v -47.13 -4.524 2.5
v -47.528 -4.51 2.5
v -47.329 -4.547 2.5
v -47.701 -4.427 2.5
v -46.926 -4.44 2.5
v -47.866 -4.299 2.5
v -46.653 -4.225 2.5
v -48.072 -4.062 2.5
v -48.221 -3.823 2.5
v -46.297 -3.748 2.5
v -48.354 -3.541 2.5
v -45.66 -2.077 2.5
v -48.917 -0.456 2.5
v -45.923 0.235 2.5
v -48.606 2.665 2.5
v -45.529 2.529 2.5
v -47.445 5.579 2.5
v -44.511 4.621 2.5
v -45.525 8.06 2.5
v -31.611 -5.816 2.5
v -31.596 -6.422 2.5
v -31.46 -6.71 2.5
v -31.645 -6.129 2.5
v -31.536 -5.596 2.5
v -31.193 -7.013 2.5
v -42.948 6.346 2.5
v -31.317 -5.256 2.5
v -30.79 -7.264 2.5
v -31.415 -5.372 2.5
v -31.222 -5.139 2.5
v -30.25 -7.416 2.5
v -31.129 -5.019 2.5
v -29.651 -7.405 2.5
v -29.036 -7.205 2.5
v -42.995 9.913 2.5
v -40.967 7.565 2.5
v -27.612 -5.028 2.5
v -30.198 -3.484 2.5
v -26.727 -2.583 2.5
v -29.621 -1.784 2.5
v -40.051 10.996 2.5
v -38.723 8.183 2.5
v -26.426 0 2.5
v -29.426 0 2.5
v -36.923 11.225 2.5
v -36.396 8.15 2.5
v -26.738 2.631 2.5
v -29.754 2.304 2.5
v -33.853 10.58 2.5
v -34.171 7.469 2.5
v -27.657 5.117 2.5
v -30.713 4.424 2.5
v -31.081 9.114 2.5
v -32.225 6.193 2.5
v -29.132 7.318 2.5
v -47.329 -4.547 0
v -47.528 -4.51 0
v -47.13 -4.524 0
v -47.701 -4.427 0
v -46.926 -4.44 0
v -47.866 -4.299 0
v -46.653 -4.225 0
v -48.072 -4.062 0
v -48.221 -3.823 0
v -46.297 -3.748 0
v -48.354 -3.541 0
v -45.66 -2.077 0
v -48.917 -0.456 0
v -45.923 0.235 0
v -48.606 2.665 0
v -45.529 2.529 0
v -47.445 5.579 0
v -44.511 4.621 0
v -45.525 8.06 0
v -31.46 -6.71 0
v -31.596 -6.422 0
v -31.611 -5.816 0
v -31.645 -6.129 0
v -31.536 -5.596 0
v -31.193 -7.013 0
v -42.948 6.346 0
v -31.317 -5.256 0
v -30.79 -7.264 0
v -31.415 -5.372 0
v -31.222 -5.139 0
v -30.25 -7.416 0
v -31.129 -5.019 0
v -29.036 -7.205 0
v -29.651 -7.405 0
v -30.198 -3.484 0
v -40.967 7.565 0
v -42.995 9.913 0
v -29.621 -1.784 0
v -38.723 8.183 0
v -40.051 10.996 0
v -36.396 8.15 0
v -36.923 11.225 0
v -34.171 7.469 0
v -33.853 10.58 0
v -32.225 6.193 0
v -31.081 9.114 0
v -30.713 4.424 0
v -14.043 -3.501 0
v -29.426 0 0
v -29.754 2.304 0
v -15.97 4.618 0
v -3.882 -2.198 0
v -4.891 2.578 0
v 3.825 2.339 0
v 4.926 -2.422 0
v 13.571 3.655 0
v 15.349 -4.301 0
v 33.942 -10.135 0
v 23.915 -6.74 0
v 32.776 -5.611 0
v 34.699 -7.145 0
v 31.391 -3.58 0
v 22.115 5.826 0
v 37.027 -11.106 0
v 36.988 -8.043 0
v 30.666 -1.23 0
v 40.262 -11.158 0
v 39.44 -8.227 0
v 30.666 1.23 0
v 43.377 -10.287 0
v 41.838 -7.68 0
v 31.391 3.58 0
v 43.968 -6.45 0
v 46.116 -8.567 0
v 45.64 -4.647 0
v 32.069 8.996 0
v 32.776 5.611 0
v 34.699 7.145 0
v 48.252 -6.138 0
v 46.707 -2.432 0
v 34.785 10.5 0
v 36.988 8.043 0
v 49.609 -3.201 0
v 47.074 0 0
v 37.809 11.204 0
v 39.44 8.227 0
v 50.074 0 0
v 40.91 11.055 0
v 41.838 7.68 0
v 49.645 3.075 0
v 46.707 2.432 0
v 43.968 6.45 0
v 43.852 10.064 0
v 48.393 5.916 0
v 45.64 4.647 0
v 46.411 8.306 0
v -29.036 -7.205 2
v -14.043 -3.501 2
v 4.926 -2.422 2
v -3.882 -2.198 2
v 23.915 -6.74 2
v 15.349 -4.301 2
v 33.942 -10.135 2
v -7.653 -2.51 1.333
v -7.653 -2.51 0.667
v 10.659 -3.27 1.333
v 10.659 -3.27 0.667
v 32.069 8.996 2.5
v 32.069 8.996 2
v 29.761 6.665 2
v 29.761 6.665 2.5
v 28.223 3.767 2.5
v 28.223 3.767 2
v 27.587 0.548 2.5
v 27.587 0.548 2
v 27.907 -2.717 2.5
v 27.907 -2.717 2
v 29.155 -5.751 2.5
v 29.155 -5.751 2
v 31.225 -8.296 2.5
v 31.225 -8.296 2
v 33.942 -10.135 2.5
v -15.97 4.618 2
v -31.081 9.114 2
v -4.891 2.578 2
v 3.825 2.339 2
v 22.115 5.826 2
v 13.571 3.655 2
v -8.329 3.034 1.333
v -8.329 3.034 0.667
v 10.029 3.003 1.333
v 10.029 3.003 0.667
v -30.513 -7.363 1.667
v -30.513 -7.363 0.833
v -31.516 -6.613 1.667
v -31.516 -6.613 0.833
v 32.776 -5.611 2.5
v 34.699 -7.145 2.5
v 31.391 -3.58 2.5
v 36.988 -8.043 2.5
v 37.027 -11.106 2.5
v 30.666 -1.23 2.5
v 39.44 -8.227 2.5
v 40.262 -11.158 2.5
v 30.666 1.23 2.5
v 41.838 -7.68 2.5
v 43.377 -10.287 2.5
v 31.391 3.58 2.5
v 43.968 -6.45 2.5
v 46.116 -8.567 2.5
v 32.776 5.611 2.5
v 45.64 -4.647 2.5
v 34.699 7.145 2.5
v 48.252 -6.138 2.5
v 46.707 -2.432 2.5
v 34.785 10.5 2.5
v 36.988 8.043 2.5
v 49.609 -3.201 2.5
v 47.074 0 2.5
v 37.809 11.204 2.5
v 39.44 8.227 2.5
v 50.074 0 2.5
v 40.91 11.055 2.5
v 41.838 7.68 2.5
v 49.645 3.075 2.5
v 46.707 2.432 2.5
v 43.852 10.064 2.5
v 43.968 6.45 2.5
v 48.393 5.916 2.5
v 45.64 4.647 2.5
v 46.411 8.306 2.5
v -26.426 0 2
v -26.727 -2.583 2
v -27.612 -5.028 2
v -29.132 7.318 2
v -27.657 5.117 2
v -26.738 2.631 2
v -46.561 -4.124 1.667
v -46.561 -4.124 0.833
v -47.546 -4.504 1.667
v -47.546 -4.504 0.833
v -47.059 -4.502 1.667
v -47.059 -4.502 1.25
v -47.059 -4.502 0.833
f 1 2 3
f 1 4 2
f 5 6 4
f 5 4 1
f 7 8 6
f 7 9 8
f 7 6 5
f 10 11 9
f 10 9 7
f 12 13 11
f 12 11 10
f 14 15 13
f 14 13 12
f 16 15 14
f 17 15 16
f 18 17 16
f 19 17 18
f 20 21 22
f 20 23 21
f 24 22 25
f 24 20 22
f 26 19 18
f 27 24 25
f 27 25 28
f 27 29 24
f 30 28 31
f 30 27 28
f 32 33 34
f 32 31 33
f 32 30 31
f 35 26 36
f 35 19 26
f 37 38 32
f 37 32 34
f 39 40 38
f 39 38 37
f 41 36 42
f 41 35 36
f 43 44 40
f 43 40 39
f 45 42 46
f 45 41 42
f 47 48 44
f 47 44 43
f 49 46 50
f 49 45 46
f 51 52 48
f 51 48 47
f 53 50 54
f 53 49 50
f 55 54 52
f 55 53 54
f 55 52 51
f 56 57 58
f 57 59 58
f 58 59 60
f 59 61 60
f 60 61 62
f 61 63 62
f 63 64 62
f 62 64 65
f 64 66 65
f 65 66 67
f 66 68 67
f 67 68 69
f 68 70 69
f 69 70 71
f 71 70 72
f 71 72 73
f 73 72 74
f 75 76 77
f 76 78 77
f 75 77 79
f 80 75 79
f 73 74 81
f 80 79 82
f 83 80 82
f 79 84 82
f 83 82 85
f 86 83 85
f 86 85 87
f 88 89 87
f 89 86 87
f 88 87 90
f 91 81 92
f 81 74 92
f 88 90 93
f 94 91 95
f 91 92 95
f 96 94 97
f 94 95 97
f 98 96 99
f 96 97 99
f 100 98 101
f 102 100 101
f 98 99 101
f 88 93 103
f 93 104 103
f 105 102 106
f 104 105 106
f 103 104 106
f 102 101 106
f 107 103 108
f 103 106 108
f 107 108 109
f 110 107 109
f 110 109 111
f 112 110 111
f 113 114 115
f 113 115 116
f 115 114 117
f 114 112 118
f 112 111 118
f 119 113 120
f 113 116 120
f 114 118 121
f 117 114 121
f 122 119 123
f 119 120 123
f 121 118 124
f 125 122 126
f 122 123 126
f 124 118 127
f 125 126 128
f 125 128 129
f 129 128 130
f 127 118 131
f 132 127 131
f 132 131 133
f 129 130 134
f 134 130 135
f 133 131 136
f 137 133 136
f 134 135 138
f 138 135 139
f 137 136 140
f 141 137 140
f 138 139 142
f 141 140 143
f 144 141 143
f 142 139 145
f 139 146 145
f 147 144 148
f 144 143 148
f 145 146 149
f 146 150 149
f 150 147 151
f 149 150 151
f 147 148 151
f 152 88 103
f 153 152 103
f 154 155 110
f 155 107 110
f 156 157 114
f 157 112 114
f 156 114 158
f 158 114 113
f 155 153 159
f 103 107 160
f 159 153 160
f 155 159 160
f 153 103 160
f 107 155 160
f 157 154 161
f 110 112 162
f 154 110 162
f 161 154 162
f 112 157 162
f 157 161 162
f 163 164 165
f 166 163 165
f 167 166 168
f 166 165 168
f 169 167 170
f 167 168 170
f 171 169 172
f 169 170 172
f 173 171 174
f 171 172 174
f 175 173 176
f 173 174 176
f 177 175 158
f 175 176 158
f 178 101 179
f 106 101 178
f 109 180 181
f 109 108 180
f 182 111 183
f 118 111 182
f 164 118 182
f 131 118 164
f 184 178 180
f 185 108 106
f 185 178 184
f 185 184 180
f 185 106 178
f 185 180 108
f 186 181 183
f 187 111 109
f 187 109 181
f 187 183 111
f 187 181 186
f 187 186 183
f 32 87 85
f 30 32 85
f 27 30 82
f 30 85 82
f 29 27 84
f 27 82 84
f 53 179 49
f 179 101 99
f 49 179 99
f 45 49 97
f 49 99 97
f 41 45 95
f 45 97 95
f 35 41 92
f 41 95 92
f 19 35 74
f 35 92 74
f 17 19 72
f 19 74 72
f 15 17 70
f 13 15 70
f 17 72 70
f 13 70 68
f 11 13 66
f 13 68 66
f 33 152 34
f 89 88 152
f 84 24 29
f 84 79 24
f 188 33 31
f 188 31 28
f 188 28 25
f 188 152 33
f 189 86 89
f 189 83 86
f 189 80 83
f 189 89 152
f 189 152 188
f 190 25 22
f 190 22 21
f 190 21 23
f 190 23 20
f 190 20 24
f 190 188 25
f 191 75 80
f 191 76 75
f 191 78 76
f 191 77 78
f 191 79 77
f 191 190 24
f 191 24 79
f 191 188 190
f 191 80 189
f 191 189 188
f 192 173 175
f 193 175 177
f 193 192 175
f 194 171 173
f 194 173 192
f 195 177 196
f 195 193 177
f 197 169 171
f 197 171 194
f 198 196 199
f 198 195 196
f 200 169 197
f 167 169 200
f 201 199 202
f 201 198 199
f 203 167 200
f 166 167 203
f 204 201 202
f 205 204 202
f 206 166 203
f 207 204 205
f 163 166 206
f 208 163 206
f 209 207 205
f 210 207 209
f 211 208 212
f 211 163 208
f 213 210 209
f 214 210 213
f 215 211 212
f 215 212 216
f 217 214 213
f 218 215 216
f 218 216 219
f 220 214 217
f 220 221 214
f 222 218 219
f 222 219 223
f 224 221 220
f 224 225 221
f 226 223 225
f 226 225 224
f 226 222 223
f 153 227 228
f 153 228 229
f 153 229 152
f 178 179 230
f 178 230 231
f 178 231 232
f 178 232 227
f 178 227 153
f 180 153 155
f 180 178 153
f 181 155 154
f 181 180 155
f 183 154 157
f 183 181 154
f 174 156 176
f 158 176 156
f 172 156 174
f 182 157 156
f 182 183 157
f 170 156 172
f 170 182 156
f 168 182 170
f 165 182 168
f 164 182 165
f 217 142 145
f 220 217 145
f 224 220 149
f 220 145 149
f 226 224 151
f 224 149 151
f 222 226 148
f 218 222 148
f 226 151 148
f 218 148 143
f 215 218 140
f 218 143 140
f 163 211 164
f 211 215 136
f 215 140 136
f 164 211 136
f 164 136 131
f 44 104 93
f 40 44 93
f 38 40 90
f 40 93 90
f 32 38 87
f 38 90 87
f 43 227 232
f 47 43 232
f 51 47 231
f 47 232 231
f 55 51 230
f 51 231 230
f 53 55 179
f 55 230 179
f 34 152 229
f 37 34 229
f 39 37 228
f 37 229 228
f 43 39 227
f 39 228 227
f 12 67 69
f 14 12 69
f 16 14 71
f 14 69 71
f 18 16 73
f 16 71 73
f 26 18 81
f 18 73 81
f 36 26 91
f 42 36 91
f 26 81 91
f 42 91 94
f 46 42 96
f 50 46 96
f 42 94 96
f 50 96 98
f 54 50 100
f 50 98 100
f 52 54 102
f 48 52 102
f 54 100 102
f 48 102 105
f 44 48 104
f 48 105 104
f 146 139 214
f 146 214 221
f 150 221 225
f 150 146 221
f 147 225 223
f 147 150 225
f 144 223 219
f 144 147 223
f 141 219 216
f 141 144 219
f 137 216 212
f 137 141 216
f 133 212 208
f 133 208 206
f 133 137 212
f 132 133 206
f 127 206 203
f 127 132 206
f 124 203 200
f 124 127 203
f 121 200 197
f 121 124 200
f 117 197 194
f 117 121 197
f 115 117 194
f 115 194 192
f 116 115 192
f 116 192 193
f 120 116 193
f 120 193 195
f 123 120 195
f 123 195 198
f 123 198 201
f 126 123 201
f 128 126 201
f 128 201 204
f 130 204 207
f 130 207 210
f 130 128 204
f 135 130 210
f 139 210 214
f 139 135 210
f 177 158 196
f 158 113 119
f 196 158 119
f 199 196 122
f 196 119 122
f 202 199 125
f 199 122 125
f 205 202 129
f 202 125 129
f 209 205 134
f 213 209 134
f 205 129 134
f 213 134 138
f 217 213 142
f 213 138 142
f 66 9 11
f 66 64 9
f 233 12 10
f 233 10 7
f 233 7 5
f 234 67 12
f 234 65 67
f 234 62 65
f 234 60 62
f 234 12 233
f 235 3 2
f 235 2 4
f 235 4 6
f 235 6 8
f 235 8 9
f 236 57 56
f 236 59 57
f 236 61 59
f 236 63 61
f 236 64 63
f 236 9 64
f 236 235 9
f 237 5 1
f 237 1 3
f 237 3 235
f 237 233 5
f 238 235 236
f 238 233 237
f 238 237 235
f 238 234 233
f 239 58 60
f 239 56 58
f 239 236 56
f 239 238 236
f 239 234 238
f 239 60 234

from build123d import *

# Parameters (mm, degrees)
F0_R     = 8.25
F1_DEPTH = 2.5
F2_DEPTH = 2


with BuildPart() as f1:
    # F0 (on Top) → F1 (new body)
    with BuildSketch(Plane.XY):
        with BuildLine():
            ThreePointArc((32.0688115177, 8.9962420553), (27.6273312583, -1.0959733646), (33.9415177003, -10.1353654102))
            ThreePointArc((33.9415177003, -10.1353654102), (44.8086587224, -9.5259748044), (50.073819207, 0))
            ThreePointArc((50.073819207, 0), (43.8521719937, 10.0637054931), (32.0688115177, 8.9962420553))
        make_face()
        with Locations((38.823819207, 0)):
            Circle(F0_R, mode=Mode.SUBTRACT)
    extrude(amount=F1_DEPTH)



with BuildPart() as f1b:
    # F0 (on Top) → F1, piece 2 (new body)
    with BuildSketch(Plane.XY):
        with BuildLine():
            ThreePointArc((-45.6604546957, -2.0769858561), (-38.7231383621, 8.1832988366), (-29.426180793, 0))
            ThreePointArc((-29.426180793, 0), (-29.8634270645, -2.6501658772), (-31.1288181692, -5.0194165669))
            ThreePointArc((-31.1288181692, -5.0194165669), (-31.2694247122, -5.1976895367), (-31.4148838182, -5.3720257066))
            add(Edge.make_bspline(
                [(-29.035736161, -7.2045275043), (-30.5396230029, -7.95646964), (-32.2793337143, -6.7201835537), (-31.4148838182, -5.3720257066)],
                knots=[0, 0, 0, 0, 2.7840168374, 2.7840168374, 2.7840168374, 2.7840168374], degree=3))
            ThreePointArc((-29.035736161, -7.2045275043), (-27.0986692211, -3.8312855473), (-26.426180793, 0))
            ThreePointArc((-26.426180793, 0), (-27.6571196172, 5.1167287553), (-31.080565354, 9.1137454968))
            ThreePointArc((-31.080565354, 9.1137454968), (-44.3248746058, 9.0750961749), (-48.354220505, -3.5414640914))
            add(Edge.make_bspline(
                [(-45.6604546957, -2.0769858561), (-46.4311366211, -5.0662274962), (-47.7208728718, -5.0662274962), (-48.354220505, -3.5414640914)],
                knots=[0, 0, 0, 0, 3.0661165562, 3.0661165562, 3.0661165562, 3.0661165562], degree=3))
        make_face()
    extrude(amount=F1_DEPTH)


with BuildPart() as f1_1:
    add(f1.part)

    add(f1b.part)  # F2 merges F1b
    # F0 (on Top) → F2 (join)
    with BuildSketch(Plane.XY):
        with BuildLine():
            ThreePointArc((-26.426180793, 0), (-27.0986692211, -3.8312855473), (-29.035736161, -7.2045275043))
            add(Edge.make_bspline(
                [(-29.035736161, -7.2045275043), (-3.4389084727, 0), (5.4949232749, 0), (33.9415177003, -10.1353654102)],
                knots=[0, 0, 0, 0, 63.0454147004, 63.0454147004, 63.0454147004, 63.0454147004], degree=3))
            ThreePointArc((33.9415177003, -10.1353654102), (27.6273312583, -1.0959733646), (32.0688115177, 8.9962420553))
            add(Edge.make_bspline(
                [(-31.080565354, 9.1137454968), (-3.4389084727, 0), (5.4949232749, 0), (32.0688115177, 8.9962420553)],
                knots=[0, 0, 0, 0, 63.1494861922, 63.1494861922, 63.1494861922, 63.1494861922], degree=3))
            ThreePointArc((-31.080565354, 9.1137454968), (-27.6571196172, 5.1167287553), (-26.426180793, 0))
        make_face()
    extrude(amount=F2_DEPTH)


solid = f1_1.part
